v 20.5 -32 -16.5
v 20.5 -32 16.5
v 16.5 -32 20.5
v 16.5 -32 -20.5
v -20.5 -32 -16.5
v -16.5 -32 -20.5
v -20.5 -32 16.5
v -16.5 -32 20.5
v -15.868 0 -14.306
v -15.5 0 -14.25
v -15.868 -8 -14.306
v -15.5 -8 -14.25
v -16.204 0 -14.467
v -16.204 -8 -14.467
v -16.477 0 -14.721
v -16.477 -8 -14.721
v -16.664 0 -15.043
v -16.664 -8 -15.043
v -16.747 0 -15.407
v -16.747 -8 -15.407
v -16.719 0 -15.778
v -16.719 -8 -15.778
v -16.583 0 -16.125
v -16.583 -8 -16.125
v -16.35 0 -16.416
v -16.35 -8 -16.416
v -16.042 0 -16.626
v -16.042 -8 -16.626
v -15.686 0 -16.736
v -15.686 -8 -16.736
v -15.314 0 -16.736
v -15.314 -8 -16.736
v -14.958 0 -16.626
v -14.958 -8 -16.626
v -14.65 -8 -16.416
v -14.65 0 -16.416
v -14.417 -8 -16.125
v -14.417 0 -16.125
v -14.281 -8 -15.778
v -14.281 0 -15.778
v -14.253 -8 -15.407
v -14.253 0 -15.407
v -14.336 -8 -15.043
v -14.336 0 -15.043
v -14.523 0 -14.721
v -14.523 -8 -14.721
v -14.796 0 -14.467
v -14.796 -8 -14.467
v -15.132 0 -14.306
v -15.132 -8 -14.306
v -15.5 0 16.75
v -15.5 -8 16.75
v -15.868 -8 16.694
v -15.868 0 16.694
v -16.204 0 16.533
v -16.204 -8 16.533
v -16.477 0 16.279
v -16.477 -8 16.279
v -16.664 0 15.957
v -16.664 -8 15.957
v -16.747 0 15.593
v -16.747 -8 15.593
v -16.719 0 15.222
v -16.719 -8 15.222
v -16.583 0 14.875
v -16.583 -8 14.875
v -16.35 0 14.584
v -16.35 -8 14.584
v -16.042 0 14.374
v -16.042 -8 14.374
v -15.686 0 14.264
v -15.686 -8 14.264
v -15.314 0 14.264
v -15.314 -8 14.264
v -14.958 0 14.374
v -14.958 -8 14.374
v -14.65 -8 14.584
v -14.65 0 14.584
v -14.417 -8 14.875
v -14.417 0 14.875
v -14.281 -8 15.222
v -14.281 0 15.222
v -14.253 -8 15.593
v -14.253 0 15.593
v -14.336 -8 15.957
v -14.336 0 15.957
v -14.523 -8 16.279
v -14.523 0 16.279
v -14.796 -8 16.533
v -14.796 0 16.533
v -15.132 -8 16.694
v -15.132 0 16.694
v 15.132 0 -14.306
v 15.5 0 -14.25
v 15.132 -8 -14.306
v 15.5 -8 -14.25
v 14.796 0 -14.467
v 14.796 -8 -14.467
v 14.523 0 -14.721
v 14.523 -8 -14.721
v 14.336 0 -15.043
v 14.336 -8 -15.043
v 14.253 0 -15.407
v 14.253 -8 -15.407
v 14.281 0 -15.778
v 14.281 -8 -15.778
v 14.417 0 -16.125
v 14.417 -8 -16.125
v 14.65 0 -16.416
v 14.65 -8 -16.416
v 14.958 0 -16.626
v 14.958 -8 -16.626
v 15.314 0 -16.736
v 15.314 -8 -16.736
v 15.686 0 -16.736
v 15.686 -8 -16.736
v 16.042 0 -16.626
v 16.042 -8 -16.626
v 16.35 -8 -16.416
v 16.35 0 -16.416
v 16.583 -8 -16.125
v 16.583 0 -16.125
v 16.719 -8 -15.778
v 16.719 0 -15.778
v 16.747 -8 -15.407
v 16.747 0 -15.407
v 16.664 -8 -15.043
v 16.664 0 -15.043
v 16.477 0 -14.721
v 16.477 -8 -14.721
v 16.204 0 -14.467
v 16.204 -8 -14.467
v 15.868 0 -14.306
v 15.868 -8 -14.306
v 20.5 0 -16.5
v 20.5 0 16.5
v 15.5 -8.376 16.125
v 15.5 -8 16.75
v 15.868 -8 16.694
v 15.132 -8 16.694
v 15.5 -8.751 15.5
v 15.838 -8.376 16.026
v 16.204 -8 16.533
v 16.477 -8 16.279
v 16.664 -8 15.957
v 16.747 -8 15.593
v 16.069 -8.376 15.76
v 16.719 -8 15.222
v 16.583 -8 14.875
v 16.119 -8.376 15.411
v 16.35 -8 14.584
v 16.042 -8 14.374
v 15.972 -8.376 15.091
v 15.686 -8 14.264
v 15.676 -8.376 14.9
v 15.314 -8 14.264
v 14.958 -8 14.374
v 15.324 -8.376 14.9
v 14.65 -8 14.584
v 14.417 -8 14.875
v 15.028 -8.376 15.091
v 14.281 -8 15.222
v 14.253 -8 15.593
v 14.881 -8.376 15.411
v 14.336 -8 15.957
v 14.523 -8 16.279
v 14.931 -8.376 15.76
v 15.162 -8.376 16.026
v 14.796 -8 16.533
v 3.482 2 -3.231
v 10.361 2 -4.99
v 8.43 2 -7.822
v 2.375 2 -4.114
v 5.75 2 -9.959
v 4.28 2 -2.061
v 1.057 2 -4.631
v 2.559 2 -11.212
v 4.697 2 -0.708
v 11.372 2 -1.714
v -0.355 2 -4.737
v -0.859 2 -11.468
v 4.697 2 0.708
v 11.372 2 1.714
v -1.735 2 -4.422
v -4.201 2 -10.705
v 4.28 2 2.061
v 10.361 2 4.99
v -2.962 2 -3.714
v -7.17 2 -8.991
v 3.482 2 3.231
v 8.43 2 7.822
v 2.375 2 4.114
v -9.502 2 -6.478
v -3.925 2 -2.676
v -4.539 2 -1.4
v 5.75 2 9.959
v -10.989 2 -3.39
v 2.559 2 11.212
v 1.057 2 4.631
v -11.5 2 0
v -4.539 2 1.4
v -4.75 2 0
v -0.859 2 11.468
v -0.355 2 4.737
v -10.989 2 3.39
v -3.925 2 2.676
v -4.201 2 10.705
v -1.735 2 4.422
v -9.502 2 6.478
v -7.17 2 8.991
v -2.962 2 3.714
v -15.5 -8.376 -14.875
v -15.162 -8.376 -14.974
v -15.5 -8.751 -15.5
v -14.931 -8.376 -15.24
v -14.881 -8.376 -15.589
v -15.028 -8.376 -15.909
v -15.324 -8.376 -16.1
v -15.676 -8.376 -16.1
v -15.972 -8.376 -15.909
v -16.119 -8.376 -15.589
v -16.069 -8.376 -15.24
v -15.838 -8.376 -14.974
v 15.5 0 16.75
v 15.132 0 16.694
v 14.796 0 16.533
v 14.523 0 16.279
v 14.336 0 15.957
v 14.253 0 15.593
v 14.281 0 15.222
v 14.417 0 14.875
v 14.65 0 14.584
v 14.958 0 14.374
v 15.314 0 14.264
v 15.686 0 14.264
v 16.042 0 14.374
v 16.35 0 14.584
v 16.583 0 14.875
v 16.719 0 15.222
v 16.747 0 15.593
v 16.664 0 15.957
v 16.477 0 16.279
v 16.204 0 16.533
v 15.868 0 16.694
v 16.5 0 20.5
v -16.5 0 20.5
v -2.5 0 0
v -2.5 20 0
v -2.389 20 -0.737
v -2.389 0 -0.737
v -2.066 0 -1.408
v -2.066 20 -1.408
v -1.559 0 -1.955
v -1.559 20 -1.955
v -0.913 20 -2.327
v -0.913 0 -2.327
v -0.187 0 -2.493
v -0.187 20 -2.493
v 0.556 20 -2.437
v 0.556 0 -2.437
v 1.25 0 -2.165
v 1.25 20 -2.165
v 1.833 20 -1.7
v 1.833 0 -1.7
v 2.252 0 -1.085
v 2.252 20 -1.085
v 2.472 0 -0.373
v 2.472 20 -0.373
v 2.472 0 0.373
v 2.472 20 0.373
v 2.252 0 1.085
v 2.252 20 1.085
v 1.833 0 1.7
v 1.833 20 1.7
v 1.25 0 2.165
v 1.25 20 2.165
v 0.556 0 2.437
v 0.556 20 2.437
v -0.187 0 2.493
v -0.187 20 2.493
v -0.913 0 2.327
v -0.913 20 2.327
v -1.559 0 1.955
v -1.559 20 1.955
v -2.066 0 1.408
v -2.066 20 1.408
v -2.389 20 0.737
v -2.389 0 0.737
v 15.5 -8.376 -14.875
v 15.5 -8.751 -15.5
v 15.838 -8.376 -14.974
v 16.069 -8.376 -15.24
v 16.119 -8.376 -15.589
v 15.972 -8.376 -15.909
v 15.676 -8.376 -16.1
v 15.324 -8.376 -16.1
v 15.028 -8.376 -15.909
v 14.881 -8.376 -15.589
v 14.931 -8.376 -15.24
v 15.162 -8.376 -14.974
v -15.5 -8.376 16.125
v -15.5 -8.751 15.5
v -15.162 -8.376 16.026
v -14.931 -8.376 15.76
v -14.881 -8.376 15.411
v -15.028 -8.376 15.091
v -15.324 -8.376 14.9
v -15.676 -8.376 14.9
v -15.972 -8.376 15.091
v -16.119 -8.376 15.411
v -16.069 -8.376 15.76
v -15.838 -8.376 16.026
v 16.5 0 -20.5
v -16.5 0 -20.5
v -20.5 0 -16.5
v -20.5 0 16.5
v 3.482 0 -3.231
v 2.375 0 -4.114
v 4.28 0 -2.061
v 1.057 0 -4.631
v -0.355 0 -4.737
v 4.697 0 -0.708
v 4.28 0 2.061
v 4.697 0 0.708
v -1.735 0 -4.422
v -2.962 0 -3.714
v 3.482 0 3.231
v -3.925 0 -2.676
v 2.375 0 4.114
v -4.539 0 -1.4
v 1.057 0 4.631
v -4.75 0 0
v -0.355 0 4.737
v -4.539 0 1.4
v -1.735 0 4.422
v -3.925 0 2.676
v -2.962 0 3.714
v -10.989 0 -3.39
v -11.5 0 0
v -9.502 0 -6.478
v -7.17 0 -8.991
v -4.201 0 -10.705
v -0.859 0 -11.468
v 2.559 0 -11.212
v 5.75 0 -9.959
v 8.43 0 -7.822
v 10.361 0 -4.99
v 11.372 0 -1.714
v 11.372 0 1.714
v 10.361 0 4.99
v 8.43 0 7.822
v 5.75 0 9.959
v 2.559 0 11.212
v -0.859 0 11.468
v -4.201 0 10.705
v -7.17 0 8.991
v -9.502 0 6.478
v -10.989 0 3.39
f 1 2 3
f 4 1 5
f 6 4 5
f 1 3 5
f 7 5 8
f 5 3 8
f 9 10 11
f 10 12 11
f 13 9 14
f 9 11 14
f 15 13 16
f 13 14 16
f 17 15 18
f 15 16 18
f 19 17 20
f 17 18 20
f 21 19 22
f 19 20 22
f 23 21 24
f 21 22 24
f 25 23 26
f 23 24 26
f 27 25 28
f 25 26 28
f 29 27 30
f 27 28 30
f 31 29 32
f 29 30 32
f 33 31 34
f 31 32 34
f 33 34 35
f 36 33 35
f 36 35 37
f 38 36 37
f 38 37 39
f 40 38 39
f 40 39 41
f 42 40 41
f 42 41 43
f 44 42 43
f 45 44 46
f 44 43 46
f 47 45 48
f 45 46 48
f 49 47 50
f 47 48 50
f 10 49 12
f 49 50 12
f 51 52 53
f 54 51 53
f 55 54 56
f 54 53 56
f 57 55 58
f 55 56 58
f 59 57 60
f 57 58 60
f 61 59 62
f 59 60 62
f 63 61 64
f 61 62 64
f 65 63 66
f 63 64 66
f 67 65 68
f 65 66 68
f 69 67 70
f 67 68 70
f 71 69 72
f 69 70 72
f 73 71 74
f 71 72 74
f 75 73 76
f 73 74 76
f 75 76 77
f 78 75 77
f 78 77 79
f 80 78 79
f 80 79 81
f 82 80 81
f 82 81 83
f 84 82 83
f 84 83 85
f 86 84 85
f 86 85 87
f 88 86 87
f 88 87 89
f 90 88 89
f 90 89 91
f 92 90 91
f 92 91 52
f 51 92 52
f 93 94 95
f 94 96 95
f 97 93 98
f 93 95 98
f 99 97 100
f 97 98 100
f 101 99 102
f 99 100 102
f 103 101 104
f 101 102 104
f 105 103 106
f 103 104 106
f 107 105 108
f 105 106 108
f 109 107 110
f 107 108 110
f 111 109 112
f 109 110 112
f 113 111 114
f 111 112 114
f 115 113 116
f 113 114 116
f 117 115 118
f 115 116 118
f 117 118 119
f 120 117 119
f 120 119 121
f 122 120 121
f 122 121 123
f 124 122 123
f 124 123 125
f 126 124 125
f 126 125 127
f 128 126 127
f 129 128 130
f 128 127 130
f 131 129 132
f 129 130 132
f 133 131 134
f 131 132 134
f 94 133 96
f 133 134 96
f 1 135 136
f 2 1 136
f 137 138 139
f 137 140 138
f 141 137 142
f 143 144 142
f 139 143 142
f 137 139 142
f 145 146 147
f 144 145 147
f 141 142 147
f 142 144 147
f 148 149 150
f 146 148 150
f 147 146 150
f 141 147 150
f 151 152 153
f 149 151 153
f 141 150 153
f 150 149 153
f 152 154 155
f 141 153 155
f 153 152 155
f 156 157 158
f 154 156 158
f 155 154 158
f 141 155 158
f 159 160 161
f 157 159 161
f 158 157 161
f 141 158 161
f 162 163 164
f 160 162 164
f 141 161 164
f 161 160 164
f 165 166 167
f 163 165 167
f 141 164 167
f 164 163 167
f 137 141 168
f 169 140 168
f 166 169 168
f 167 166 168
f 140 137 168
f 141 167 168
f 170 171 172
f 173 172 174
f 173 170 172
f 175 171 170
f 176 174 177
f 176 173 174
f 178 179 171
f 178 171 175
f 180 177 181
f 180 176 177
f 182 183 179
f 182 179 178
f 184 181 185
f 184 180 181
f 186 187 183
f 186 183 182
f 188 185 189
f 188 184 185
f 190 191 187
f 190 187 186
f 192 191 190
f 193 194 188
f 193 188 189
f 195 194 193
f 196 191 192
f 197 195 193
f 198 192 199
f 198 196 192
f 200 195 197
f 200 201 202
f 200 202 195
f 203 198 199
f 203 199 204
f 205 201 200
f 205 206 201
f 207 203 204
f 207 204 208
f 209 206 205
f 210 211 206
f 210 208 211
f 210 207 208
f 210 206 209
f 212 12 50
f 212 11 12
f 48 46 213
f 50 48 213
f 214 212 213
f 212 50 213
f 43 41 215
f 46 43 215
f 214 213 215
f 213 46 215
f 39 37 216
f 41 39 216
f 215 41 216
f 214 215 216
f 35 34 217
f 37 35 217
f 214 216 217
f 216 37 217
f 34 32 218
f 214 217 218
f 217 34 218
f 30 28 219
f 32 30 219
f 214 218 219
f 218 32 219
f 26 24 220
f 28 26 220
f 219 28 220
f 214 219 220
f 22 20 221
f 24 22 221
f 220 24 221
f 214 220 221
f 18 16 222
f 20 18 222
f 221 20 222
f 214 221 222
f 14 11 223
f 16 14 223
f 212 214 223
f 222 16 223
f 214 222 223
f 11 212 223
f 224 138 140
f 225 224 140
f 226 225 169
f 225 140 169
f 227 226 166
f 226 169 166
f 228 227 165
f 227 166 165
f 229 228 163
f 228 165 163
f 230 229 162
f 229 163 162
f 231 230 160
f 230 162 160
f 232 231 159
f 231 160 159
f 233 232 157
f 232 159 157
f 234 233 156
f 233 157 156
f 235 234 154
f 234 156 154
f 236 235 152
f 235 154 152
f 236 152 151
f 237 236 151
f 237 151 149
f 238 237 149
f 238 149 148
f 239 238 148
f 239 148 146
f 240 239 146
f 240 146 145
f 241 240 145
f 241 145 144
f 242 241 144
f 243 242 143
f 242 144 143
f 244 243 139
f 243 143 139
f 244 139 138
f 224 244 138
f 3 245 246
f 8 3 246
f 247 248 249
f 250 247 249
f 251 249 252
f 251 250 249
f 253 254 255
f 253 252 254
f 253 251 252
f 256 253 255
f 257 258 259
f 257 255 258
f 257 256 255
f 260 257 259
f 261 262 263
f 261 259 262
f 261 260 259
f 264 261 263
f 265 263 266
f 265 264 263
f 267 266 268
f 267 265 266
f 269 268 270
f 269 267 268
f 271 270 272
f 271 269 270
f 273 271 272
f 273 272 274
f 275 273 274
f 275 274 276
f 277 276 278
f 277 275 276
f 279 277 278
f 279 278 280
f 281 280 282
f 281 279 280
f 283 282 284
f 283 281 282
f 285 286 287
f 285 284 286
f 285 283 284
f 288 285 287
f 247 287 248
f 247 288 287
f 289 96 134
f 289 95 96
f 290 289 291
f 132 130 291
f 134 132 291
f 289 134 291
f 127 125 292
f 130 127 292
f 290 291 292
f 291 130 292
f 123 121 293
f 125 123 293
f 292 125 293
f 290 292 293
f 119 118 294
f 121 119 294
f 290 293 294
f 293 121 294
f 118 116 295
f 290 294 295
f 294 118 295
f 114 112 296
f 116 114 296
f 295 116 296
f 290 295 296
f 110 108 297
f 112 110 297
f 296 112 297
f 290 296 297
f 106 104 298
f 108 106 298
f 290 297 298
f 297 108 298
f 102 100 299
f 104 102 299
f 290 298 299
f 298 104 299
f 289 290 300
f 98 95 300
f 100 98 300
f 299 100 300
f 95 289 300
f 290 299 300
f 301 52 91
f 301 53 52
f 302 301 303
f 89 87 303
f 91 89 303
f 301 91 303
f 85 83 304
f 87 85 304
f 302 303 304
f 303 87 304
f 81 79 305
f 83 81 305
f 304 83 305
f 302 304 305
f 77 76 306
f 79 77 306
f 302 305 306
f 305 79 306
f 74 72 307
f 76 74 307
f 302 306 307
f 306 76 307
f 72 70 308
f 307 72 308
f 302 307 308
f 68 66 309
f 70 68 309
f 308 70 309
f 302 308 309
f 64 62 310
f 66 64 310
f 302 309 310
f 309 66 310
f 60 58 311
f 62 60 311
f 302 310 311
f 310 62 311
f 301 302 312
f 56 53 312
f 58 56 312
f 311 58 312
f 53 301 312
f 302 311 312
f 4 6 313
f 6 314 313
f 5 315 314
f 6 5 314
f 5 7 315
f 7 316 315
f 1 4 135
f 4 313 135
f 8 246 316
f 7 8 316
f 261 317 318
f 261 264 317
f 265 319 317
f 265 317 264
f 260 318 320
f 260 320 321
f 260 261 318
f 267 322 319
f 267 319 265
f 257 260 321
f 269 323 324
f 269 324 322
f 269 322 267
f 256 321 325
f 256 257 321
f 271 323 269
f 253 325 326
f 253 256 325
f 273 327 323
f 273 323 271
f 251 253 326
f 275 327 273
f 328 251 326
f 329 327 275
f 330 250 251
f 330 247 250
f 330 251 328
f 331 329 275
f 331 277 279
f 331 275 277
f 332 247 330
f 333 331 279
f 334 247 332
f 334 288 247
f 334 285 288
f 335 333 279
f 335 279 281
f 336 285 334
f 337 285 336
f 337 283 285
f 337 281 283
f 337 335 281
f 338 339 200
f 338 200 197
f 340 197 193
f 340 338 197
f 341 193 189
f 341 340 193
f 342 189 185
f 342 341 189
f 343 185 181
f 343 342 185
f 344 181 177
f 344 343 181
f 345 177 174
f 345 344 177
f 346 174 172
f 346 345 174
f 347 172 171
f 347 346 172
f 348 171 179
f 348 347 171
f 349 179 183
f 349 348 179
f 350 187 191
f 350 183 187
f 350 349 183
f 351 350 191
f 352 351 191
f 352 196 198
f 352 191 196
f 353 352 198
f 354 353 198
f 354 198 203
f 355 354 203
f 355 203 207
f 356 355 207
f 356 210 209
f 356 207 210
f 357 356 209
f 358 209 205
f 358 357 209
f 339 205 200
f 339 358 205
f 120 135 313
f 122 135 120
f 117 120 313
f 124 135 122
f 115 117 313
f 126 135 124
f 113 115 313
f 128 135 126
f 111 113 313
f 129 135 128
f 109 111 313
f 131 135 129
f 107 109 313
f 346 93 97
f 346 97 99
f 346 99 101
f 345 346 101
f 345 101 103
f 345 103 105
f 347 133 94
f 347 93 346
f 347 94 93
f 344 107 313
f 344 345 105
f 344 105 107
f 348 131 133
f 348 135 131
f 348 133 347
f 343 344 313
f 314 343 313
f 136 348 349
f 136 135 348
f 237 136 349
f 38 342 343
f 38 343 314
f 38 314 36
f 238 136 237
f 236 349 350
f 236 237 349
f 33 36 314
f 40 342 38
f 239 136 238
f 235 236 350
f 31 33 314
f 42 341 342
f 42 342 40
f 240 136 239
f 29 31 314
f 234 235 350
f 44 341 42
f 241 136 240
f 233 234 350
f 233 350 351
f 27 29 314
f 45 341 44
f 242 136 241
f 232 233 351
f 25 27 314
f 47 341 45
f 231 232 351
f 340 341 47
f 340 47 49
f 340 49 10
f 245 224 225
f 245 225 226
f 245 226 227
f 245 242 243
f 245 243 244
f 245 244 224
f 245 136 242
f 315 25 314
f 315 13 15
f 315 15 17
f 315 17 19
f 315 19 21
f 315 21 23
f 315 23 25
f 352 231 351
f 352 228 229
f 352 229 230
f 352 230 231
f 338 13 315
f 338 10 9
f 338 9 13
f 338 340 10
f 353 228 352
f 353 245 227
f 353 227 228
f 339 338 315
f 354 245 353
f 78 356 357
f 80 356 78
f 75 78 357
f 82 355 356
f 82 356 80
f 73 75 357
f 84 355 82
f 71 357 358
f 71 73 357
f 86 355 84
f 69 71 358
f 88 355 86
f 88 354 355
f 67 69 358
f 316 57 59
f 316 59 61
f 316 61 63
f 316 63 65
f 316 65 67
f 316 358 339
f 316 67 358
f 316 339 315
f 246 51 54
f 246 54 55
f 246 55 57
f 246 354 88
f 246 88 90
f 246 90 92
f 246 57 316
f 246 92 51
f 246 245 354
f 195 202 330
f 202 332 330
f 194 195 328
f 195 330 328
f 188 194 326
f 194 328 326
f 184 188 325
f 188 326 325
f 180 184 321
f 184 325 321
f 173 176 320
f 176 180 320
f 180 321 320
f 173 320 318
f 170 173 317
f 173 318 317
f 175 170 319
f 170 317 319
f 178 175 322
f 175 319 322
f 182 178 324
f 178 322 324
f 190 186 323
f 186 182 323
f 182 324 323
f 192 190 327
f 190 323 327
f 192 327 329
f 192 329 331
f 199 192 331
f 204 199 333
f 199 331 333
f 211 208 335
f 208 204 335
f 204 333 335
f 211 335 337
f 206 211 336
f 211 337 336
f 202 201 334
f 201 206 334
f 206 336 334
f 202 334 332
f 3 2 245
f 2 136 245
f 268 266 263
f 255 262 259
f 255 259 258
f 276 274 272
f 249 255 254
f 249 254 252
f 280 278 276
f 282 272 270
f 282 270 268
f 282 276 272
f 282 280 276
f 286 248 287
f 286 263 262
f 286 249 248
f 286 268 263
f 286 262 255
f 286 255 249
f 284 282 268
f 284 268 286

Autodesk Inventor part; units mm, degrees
ref_plane "YZ Plane" through (0, 0, 0) normal (1, 0, 0) x (0, 1, 0)
ref_plane "XZ Plane" through (0, 0, 0) normal (0, 1, 0) x (-1, 0, 0)
ref_plane "XY Plane" through (0, 0, 0) normal (0, 0, 1) x (1, 0, 0)
sketch "Sketch1" plane through (0, 0, 0) normal (0, 1, 0) x (-1, 0, 0)
  line L0 (16.5, -20.5) -> (-16.5, -20.5)
  line L1 (-20.5, -16.5) -> (-20.5, 16.5)
  line L2 (-16.5, 20.5) -> (16.5, 20.5)
  line L3 (20.5, 16.5) -> (20.5, -16.5)
  line L4 (20.5, -16.5) -> (16.5, -20.5)
  line L5 (-16.5, -20.5) -> (-20.5, -16.5)
  line L6 (-20.5, 16.5) -> (-16.5, 20.5)
  line L7 (16.5, 20.5) -> (20.5, 16.5)
  point P0 (0, 0)
  point P1 (20.5, -20.5)
  point P2 (-20.5, 20.5)
  point P3 (-20.5, -20.5)
  point P4 (20.5, 20.5)
  dimension "d0" = 41
  dimension "d2" = 41
  dimension "d3" = 20.5
  dimension "d4" = 20.5
  dimension "d5" = 4
  dimension "d6" = 4
  dimension "d7" = 4
  dimension "d8" = 4
  dimension "d9" = 4
  dimension "d10" = 4
  dimension "d11" = 4
  dimension "d12" = 4
extrude "Extrusion1" add sketch "Sketch1" against normal blind 32
sketch "Sketch4" plane through (0, 0, 0) normal (0, 1, 0) x (-1, 0, 0)
  circle A0 centre (0, 0) radius 11.5
  circle A1 centre (0, 0) radius 4.75
  dimension "d24" = 23
  dimension "d26" = 9.5
extrude "Extrusion4" add sketch "Sketch4" along normal blind 2
sketch "Sketch5" plane through (0, 0, 0) normal (0, 1, 0) x (-1, 0, 0)
  circle A0 centre (0, 0) radius 2.5
  dimension "d29" = 5
extrude "Extrusion5" add sketch "Sketch5" along normal blind 20
sketch "Sketch6" plane through (0, 0, 0) normal (0, 1, 0) x (1, 0, 0)
  line L0 (-20.5, -16.5) -> (-20.5, 16.5) projected
  line L1 (-16.5, 20.5) -> (16.5, 20.5) projected
  circle A0 centre (0, 0) radius 11.5 projected
  point P0 (-15.5, 15.5)
  point P1 (-15.5, -15.5)
  point P2 (15.5, 15.5)
  point P3 (15.5, -15.5)
  dimension "d33" = 15.5
  dimension "d34" = 15.5
  dimension "d37" = 31
  dimension "d40" = 31
hole "Hole1" at (-15.5, 0, -15.5) at (-15.5, 0, 15.5) at (15.5, 0, -15.5) at (15.5, 0, 15.5) direction (0, -1, 0) diameter 2.5 depth 8 tip angle 118
thread "Thread1" size "M2.5x0.45" class "6H" standard "ANSI Metric M Profile" full length
thread "Thread2" size "M2.5x0.45" class "6H" standard "ANSI Metric M Profile" full length
thread "Thread3" size "M2.5x0.45" class "6H" standard "ANSI Metric M Profile" full length
thread "Thread4" size "M2.5x0.45" class "6H" standard "ANSI Metric M Profile" full length
equation "\"d3\" = 0.5 * d2"
equation "\"d4\" = 0.5 * d0"
equation "\"d6\" = d5"
equation "\"d7\" = d5"
equation "\"d8\" = d7"
equation "\"d9\" = d5"
equation "\"d10\" = d9"
equation "\"d11\" = d5"
equation "\"d12\" = d11"
equation "\"d33\" = 0.5 * d37"
equation "\"d34\" = d33"
properties part number "stepper_short"
